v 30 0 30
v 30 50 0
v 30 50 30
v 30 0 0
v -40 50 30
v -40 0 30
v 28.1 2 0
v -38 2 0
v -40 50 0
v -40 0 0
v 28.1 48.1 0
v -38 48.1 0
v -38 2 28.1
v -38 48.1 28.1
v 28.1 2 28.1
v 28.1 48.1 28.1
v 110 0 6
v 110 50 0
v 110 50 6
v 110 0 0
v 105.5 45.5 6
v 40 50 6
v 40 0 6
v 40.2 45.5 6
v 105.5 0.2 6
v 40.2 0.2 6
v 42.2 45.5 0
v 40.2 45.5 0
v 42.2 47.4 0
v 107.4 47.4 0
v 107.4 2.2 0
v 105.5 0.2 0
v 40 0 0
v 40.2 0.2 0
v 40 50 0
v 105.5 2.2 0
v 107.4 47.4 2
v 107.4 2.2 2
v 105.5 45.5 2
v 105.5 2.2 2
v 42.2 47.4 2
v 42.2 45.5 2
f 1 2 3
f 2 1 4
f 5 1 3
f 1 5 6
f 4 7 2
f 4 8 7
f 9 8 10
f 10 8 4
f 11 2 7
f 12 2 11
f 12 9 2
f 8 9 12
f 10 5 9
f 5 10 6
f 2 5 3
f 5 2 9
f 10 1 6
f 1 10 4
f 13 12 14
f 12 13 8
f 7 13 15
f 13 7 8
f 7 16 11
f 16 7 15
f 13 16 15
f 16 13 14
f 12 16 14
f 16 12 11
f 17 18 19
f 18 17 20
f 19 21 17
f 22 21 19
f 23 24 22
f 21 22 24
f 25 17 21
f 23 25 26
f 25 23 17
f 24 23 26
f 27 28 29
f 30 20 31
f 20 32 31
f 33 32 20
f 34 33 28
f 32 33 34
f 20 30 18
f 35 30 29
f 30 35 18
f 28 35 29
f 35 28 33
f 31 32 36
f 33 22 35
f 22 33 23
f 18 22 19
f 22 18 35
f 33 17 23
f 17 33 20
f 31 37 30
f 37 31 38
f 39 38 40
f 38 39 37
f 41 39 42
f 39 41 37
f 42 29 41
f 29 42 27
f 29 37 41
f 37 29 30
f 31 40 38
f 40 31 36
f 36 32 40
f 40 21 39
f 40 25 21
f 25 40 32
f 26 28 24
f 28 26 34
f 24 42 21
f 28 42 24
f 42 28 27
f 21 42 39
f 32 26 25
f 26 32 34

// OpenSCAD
// Two-part enclosure for small electronics board
// Part 1: Box (left)
// Part 2: Lid (right, printed upside down)
// Prints together with a 10mm gap between them.

// --- Dimensions ---
// Box Outer Dimensions (X x Y x Z)
$box_outer_x = 70;
$box_outer_y = 50;
$box_outer_z = 30;

// Wall and Floor Thickness
$wall_thickness = 2;
$floor_thickness = 2;

// Lid Dimensions
// Plate thickness
$plate_thickness = 2;
// Lip dimensions
$lip_thickness = 1.5;
$lip_height = 4;
// Lip outer size (fits inside box opening)
$lip_outer_x = 65.6;
$lip_outer_y = 45.6;

// Clearance
$clearance = 0.2;

// Gap between parts
$gap = 10;

// --- Configuration ---
$fn = 64; // Smooth curves

// --- Part 1: The Box ---
// Position: Centered on its own footprint, then shifted to left side of bed.
// Footprint: 70 x 50.
// Box center X = -($box_outer_x/2 + $gap/2)
// Box center Y = 0
translate([-($box_outer_x/2 + $gap/2), 0, 0])
difference() {
    // Outer Block
    cube([
        $box_outer_x, 
        $box_outer_y, 
        $box_outer_z
    ]);
    
    // Cut out the inside (hollow)
    // Inner X = Outer X - 2*Wall
    // Inner Y = Outer Y - 2*Wall
    // Inner Z = Outer Z - Floor
    translate([
        $wall_thickness, 
        $wall_thickness, 
        0
    ])
    cube([
        $box_outer_x - (2 * $wall_thickness), 
        $box_outer_y - (2 * $wall_thickness), 
        $box_outer_z - $floor_thickness
    ]);
    
    // Extend cut slightly to ensure clean separation (Rule 5)
    // We extend the cut volume slightly past the inner walls and floor/ceiling
    // to avoid coplanar faces between the cut and the remaining shell.
    translate([
        $wall_thickness, 
        $wall_thickness, 
        0
    ])
    cube([
        $box_outer_x - (2 * $wall_thickness) + 0.1, 
        $box_outer_y - (2 * $wall_thickness) + 0.1, 
        $box_outer_z - $floor_thickness + 0.1
    ]);
}

// --- Part 2: The Lid ---
// Position: Centered on its own footprint, then shifted to right side of bed.
// Footprint: 70 x 50.
// Lid center X = ($box_outer_x/2 + $gap/2)
// Lid center Y = 0
// The lid is printed upside down (plate on bed), so we build it normally 
// but the "lip" is the top part of the geometry relative to the print direction.
// However, the prompt says "printed upside down: a plate... lying on the bed".
// This implies the plate is at Z=0, and the lip sticks UP from the plate.
// The lip slides INTO the box.
// Box inner top Z = $box_outer_z - $floor_thickness = 28.
// Lip height = 4.
// So the top of the lip is at Z=4. This fits easily under the box top (Z=30).

translate([($box_outer_x/2 + $gap/2), 0, 0])
difference() {
    // Outer Block (Plate + Lip volume)
    // Width: 70, Depth: 50, Height: Plate + Lip
    cube([
        $box_outer_x, 
        $box_outer_y, 
        $plate_thickness + $lip_height
    ]);
    
    // Cut out the hole for the electronics (under the lip)
    // The hole goes through the plate and up to the bottom of the lip.
    // Hole X = Lip Outer X - 2*Clearance
    // Hole Y = Lip Outer Y - 2*Clearance
    // Hole Z = Plate Thickness (so it stops at the top of the plate)
    translate([
        $wall_thickness, // Align with box wall logic for reference, but calculate based on lip
        $wall_thickness, 
        0
    ])
    // Calculate inner hole dimensions based on lip outer size and clearance
    translate([
        ($lip_outer_x/2) - ($lip_outer_x/2 - $clearance), 
        ($lip_outer_y/2) - ($lip_outer_y/2 - $clearance), 
        0
    ])
    cube([
        $lip_outer_x - (2 * $clearance), 
        $lip_outer_y - (2 * $clearance), 
        $plate_thickness
    ]);
    
    // Extend cut slightly
    translate([
        ($lip_outer_x/2) - ($lip_outer_x/2 - $clearance), 
        ($lip_outer_y/2) - ($lip_outer_y/2 - $clearance), 
        0
    ])
    cube([
        $lip_outer_x - (2 * $clearance) + 0.1, 
        $lip_outer_y - (2 * $clearance) + 0.1, 
        $plate_thickness + 0.1
    ]);
    
    // Cut out the lip itself (the part that goes over the box)
    // Lip is centered on the plate.
    // Lip Outer X = 65.6, Lip Outer Y = 45.6
    // Lip Inner X = Lip Outer X - 2*Clearance
    // Lip Inner Y = Lip Outer Y - 2*Clearance
    translate([
        ($lip_outer_x/2) - ($lip_outer_x/2 - $clearance), 
        ($lip_outer_y/2) - ($lip_outer_y/2 - $clearance), 
        $plate_thickness
    ])
    cube([
        $lip_outer_x - (2 * $clearance), 
        $lip_outer_y - (2 * $clearance), 
        $lip_height
    ]);
    
    // Extend cut slightly
    translate([
        ($lip_outer_x/2) - ($lip_outer_x/2 - $clearance), 
        ($lip_outer_y/2) - ($lip_outer_y/2 - $clearance), 
        $plate_thickness
    ])
    cube([
        $lip_outer_x - (2 * $clearance) + 0.1, 
        $lip_outer_y - (2 * $clearance) + 0.1, 
        $lip_height + 0.1
    ]);
}
